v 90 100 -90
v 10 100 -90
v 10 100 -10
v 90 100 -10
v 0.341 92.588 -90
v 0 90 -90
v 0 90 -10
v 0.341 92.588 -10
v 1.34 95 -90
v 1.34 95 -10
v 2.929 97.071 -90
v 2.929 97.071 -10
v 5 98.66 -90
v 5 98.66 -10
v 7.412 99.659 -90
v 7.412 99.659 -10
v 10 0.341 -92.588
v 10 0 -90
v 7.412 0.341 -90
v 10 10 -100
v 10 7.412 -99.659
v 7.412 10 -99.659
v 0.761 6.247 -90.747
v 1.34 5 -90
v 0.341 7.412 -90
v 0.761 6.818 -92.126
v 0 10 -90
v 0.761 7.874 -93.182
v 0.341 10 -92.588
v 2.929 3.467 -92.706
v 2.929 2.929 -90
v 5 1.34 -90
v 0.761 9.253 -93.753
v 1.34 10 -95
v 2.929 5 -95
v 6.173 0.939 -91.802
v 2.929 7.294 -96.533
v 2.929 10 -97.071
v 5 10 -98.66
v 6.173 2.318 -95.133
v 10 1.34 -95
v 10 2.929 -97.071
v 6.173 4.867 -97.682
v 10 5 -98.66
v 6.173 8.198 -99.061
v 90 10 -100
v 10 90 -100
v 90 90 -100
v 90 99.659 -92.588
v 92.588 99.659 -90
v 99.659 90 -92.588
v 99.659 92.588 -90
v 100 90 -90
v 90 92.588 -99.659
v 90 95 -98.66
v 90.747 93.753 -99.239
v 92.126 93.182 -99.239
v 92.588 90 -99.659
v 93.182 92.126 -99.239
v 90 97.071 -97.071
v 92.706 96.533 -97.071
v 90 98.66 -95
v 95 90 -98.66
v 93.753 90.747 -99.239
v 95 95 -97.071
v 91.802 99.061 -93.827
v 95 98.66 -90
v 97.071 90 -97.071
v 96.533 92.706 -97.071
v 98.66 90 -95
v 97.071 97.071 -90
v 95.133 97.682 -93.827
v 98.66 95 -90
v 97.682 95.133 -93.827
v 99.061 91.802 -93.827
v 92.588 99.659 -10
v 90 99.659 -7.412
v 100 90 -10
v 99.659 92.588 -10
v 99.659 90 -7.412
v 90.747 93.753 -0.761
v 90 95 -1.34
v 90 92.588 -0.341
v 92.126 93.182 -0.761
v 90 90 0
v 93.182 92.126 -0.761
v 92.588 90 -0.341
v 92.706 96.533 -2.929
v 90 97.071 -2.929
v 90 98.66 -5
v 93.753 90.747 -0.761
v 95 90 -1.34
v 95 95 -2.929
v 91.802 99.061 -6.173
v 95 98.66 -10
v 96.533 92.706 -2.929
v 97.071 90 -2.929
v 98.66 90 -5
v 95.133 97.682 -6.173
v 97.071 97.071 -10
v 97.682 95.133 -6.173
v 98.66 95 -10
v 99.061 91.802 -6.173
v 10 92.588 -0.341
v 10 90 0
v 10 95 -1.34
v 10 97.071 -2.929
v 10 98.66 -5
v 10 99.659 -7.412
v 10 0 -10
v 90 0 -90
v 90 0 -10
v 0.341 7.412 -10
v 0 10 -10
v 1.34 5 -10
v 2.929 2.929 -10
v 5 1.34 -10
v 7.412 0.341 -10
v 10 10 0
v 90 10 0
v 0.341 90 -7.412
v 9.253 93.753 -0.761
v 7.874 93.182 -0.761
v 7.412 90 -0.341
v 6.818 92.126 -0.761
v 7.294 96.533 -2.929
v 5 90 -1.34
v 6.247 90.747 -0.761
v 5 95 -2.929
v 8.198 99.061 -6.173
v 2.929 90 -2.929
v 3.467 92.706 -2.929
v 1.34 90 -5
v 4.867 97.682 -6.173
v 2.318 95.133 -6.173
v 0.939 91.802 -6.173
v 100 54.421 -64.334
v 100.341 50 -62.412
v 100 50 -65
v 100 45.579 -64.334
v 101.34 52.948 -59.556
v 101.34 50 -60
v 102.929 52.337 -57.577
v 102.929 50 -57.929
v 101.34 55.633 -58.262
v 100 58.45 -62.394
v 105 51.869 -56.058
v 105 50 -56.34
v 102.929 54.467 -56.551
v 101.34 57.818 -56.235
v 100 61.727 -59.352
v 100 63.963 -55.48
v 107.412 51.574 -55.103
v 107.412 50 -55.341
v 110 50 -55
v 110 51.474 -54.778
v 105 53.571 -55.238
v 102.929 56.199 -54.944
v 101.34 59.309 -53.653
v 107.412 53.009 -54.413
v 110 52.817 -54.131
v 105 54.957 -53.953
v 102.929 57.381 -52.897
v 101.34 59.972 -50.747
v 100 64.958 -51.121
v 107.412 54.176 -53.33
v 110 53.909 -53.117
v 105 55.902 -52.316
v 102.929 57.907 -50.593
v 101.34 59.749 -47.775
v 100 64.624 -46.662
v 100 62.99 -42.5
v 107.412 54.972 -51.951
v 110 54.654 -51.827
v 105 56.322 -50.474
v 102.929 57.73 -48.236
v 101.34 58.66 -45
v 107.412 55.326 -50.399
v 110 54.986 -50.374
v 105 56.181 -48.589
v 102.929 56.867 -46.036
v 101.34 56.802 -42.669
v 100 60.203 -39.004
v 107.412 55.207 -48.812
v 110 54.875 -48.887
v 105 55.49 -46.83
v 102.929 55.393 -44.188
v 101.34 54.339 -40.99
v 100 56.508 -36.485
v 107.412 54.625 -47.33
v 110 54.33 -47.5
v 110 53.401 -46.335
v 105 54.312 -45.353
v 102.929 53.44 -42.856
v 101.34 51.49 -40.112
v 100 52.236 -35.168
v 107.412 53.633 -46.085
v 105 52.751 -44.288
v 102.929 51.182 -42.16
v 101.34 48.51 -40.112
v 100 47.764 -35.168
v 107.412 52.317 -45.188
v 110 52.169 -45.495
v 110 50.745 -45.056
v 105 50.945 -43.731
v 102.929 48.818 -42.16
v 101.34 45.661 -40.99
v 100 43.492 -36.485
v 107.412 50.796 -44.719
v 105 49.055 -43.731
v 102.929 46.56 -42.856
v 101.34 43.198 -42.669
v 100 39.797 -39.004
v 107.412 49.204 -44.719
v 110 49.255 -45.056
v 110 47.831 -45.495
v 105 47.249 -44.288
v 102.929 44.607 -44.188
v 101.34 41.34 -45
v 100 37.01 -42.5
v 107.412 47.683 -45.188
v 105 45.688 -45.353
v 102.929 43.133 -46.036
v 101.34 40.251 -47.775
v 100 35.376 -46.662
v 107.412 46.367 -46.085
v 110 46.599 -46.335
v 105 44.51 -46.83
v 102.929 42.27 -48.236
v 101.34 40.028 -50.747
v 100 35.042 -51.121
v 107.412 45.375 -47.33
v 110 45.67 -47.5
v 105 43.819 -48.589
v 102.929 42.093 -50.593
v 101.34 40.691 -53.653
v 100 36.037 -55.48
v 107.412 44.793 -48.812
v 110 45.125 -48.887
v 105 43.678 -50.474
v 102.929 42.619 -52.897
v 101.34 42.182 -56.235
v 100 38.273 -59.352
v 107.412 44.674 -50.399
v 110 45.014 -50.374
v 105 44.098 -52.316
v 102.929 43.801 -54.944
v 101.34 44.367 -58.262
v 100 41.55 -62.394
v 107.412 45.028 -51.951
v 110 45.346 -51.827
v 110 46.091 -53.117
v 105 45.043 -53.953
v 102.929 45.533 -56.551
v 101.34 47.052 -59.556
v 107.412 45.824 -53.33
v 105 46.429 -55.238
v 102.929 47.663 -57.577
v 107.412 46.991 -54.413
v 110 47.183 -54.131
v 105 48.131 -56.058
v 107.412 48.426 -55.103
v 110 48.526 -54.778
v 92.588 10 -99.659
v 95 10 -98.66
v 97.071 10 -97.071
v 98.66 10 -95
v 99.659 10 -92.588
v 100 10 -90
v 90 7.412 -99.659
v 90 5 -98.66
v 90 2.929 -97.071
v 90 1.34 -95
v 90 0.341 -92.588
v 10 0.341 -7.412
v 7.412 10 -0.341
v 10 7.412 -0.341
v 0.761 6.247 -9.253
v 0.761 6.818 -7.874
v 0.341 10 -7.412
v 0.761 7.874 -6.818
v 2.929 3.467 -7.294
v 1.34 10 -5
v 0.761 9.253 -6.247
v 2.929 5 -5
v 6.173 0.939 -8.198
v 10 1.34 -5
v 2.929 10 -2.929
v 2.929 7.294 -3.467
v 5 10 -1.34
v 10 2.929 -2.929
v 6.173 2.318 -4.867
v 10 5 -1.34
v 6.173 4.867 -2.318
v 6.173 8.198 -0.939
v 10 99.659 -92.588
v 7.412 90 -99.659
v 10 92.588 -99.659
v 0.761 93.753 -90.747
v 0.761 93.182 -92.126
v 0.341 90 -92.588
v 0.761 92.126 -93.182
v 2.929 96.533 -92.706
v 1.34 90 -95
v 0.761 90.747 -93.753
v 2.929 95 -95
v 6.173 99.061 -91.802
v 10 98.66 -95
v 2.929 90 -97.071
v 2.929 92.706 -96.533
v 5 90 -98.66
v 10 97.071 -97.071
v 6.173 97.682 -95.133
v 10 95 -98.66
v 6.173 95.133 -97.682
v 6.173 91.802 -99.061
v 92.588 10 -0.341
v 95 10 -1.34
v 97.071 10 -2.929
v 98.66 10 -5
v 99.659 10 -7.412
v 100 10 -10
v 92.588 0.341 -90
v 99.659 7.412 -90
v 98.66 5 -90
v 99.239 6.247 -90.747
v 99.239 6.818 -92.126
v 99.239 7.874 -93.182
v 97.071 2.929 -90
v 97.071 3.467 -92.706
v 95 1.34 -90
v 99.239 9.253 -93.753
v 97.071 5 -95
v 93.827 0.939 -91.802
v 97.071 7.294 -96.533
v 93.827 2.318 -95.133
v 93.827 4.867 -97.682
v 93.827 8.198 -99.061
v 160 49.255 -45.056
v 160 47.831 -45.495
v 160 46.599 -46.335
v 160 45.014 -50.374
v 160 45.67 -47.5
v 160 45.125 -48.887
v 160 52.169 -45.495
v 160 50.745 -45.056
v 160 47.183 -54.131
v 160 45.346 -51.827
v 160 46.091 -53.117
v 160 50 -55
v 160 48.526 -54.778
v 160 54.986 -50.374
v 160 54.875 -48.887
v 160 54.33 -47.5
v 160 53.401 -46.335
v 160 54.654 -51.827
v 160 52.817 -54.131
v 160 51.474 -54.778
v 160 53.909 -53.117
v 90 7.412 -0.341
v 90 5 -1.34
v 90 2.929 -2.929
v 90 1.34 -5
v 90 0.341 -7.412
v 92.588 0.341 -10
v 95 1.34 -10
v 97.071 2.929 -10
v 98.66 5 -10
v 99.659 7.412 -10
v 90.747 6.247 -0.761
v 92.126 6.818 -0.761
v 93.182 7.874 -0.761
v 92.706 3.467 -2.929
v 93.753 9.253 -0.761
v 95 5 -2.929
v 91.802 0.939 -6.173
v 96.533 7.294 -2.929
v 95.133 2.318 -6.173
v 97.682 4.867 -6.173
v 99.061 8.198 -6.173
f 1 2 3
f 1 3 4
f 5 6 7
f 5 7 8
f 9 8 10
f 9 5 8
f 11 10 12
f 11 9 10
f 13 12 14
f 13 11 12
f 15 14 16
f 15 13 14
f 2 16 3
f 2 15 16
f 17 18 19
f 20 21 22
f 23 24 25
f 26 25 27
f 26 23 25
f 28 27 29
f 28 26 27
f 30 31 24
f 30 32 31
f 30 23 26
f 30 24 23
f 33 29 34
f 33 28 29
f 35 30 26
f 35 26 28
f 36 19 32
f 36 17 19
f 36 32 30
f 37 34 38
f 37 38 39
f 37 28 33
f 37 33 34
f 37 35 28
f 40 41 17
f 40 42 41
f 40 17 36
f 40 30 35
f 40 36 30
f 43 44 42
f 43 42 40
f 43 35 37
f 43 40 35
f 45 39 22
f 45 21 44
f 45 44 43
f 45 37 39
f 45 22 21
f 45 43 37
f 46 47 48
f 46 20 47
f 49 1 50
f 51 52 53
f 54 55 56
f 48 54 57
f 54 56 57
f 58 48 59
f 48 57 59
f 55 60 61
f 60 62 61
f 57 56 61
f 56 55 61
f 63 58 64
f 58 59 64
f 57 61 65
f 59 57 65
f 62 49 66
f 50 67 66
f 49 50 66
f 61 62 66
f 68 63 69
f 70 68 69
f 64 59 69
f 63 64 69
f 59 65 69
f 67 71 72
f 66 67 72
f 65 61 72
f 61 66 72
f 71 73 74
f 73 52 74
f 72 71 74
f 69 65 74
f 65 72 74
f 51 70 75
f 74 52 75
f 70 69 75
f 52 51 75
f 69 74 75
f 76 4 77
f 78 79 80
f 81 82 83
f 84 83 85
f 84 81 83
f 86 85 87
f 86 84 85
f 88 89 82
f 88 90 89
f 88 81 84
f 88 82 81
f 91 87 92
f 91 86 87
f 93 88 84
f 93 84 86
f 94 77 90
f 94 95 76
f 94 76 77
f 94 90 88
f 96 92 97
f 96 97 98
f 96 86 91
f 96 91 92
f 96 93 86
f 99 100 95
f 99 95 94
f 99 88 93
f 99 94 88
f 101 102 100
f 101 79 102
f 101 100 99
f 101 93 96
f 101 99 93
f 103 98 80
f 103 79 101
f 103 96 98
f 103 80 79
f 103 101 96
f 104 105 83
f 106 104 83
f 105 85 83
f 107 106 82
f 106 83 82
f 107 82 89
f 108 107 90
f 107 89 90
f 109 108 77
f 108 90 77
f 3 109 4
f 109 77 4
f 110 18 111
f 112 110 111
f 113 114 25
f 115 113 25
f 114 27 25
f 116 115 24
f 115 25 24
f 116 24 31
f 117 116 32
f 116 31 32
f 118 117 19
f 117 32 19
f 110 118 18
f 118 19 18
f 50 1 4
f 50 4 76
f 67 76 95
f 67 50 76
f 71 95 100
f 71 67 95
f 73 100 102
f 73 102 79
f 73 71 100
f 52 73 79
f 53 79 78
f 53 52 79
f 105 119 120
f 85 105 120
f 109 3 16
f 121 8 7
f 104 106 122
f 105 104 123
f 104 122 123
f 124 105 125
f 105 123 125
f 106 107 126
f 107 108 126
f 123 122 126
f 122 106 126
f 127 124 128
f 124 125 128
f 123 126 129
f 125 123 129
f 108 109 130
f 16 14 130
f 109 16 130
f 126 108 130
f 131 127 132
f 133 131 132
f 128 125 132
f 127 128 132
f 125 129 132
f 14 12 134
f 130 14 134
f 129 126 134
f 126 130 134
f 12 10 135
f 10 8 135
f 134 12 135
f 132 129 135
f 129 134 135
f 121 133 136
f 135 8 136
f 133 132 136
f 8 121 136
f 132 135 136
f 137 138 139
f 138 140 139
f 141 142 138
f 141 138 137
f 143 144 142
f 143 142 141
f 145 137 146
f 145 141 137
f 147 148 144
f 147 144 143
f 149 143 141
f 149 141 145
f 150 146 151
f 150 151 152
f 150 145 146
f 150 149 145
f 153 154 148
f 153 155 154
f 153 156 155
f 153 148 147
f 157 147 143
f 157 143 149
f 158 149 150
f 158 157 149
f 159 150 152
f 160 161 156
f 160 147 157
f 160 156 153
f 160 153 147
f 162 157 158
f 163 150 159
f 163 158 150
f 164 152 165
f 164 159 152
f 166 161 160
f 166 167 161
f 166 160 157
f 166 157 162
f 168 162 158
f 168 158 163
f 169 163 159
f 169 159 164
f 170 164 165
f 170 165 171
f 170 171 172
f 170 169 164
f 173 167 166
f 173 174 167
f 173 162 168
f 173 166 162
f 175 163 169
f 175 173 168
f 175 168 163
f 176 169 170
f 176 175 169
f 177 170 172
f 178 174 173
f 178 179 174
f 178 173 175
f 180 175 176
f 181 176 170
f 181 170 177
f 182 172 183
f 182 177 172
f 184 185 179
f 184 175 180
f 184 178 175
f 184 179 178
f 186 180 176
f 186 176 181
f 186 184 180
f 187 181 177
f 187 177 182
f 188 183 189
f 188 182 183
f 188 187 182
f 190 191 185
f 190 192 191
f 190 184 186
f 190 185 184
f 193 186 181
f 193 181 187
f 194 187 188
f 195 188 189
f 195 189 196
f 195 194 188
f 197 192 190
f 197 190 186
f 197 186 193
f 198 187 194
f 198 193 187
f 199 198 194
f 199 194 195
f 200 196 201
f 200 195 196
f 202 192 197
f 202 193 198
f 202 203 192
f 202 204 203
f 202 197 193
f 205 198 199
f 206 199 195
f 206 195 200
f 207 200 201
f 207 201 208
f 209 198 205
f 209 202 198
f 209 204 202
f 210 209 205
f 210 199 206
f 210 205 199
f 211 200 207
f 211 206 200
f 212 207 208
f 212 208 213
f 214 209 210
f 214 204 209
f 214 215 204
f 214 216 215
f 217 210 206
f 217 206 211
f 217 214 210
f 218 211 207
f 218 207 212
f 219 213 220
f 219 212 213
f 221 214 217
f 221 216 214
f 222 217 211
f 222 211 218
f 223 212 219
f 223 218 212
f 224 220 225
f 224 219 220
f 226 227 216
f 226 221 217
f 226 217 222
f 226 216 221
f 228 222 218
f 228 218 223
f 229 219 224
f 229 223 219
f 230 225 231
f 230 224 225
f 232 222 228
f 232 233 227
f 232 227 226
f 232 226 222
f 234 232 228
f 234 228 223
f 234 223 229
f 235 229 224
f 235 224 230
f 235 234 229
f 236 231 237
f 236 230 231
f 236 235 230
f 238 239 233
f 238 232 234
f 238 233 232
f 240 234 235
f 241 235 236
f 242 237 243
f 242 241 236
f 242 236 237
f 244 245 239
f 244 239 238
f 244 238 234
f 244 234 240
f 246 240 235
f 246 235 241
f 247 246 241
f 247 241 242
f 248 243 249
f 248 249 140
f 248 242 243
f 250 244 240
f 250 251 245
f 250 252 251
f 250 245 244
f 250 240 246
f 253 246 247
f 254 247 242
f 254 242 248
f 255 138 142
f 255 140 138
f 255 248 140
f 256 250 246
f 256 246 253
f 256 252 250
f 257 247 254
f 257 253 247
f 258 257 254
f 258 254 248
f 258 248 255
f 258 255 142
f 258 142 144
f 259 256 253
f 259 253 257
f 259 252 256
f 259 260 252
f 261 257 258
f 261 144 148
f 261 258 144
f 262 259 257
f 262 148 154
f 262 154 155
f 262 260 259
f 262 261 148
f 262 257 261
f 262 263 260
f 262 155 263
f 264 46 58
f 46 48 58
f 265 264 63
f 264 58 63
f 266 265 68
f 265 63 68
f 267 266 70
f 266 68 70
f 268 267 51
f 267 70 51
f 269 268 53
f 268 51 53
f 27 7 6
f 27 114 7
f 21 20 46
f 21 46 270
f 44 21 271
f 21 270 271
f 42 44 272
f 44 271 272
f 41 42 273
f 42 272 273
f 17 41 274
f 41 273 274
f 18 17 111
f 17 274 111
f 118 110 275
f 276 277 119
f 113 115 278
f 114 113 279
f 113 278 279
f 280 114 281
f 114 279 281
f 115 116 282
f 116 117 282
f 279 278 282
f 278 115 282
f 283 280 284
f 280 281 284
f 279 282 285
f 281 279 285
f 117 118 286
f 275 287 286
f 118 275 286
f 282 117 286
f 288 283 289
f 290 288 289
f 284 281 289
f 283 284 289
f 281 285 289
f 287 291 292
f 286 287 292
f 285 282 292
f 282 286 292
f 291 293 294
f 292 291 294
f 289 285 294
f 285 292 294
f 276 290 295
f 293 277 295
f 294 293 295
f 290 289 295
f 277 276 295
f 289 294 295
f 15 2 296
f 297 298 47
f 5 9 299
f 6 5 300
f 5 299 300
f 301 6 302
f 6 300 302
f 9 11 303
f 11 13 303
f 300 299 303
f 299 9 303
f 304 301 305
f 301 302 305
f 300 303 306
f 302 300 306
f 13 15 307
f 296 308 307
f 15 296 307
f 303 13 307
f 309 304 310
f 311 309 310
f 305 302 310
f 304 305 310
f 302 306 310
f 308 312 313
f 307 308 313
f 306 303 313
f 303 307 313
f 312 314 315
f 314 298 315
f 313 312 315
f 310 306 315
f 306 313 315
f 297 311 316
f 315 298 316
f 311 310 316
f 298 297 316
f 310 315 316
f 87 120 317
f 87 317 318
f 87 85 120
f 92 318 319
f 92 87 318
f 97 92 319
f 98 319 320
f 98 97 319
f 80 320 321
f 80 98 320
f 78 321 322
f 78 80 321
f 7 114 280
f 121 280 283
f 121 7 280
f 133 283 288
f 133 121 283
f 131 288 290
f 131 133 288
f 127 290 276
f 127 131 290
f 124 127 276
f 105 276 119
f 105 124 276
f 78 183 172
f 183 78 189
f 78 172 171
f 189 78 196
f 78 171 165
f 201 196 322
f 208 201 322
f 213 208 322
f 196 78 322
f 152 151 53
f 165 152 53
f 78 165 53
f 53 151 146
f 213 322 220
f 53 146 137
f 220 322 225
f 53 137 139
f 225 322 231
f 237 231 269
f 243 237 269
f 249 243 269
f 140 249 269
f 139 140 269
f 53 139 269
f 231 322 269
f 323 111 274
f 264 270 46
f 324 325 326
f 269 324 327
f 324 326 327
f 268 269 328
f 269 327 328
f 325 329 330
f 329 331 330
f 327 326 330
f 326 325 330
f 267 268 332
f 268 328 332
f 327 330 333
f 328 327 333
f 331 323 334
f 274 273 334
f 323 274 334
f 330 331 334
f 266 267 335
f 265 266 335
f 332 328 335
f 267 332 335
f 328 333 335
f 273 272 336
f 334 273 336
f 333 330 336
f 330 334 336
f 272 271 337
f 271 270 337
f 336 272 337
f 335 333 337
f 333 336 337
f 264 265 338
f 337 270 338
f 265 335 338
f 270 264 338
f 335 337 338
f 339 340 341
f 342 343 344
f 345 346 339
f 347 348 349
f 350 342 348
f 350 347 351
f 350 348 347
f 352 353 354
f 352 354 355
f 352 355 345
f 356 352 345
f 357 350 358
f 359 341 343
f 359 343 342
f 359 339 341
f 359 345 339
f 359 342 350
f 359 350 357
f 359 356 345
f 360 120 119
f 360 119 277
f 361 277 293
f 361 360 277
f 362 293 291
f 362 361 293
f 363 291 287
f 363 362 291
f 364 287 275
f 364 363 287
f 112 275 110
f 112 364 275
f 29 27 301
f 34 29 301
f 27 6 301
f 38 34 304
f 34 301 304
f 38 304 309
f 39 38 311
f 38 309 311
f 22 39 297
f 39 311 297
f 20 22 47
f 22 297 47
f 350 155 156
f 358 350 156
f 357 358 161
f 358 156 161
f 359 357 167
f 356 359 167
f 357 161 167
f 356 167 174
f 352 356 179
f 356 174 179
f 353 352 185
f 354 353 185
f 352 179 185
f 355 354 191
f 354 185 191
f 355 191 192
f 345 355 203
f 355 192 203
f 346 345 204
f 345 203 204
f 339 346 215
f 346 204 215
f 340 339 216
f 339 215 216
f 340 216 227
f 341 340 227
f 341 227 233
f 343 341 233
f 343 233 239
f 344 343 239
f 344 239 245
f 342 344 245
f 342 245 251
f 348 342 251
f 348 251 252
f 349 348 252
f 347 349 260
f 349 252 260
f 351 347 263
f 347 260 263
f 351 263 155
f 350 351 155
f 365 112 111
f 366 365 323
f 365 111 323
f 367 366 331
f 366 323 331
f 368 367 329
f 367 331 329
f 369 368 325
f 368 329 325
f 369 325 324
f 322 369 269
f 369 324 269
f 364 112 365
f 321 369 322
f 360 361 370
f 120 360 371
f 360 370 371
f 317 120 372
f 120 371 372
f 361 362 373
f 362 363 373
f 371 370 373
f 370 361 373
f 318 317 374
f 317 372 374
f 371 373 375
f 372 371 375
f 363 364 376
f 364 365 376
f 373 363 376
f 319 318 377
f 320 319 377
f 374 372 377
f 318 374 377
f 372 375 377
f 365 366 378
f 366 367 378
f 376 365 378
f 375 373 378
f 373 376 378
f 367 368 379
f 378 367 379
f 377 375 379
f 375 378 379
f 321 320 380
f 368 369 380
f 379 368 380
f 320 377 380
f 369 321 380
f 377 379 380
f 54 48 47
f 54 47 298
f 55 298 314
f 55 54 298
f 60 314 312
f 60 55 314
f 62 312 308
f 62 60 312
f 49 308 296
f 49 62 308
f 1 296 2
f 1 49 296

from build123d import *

# Parameters (mm, degrees)
SKETCH2_W           = 100
SKETCH2_H           = 100
BOSS_EXTRUDE1_DEPTH = 100
SKETCH3_R           = 5
BOSS_EXTRUDE2_DEPTH = 60
FILLET5_R           = 10


with BuildPart() as part:
    # Sketch2 → Boss-Extrude1 (new body)
    with BuildSketch(Plane(origin=(0, 0, 0), x_dir=(1, 0, 0), z_dir=(0, 1, 0))):
        with Locations((50, 50)):
            Rectangle(SKETCH2_W, SKETCH2_H)
    extrude(amount=BOSS_EXTRUDE1_DEPTH)

    # Sketch3 → Boss-Extrude2 (add)
    with BuildSketch(Plane(origin=(100, 0, 0), x_dir=(0, 0, -1), z_dir=(1, 0, 0))):
        with Locations((50, 50)):
            Circle(SKETCH3_R)
    extrude(amount=BOSS_EXTRUDE2_DEPTH)

    # Fillet5
    fillet5_edges = [part.edges().sort_by_distance(p)[0] for p in [
        (100, 100, -50),
        (50, 100, -100),
        (100, 50, -45),
        (0, 100, -50),
        (50, 0, -100),
        (100, 0, -50),
        (50, 0, 0),
        (0, 0, -50),
        (50, 100, 0),
        (0, 50, -100),
        (100, 50, -100),
        (100, 50, 0),
        (0, 50, 0),
    ]]
    fillet(fillet5_edges, radius=FILLET5_R)


solid = part.part
